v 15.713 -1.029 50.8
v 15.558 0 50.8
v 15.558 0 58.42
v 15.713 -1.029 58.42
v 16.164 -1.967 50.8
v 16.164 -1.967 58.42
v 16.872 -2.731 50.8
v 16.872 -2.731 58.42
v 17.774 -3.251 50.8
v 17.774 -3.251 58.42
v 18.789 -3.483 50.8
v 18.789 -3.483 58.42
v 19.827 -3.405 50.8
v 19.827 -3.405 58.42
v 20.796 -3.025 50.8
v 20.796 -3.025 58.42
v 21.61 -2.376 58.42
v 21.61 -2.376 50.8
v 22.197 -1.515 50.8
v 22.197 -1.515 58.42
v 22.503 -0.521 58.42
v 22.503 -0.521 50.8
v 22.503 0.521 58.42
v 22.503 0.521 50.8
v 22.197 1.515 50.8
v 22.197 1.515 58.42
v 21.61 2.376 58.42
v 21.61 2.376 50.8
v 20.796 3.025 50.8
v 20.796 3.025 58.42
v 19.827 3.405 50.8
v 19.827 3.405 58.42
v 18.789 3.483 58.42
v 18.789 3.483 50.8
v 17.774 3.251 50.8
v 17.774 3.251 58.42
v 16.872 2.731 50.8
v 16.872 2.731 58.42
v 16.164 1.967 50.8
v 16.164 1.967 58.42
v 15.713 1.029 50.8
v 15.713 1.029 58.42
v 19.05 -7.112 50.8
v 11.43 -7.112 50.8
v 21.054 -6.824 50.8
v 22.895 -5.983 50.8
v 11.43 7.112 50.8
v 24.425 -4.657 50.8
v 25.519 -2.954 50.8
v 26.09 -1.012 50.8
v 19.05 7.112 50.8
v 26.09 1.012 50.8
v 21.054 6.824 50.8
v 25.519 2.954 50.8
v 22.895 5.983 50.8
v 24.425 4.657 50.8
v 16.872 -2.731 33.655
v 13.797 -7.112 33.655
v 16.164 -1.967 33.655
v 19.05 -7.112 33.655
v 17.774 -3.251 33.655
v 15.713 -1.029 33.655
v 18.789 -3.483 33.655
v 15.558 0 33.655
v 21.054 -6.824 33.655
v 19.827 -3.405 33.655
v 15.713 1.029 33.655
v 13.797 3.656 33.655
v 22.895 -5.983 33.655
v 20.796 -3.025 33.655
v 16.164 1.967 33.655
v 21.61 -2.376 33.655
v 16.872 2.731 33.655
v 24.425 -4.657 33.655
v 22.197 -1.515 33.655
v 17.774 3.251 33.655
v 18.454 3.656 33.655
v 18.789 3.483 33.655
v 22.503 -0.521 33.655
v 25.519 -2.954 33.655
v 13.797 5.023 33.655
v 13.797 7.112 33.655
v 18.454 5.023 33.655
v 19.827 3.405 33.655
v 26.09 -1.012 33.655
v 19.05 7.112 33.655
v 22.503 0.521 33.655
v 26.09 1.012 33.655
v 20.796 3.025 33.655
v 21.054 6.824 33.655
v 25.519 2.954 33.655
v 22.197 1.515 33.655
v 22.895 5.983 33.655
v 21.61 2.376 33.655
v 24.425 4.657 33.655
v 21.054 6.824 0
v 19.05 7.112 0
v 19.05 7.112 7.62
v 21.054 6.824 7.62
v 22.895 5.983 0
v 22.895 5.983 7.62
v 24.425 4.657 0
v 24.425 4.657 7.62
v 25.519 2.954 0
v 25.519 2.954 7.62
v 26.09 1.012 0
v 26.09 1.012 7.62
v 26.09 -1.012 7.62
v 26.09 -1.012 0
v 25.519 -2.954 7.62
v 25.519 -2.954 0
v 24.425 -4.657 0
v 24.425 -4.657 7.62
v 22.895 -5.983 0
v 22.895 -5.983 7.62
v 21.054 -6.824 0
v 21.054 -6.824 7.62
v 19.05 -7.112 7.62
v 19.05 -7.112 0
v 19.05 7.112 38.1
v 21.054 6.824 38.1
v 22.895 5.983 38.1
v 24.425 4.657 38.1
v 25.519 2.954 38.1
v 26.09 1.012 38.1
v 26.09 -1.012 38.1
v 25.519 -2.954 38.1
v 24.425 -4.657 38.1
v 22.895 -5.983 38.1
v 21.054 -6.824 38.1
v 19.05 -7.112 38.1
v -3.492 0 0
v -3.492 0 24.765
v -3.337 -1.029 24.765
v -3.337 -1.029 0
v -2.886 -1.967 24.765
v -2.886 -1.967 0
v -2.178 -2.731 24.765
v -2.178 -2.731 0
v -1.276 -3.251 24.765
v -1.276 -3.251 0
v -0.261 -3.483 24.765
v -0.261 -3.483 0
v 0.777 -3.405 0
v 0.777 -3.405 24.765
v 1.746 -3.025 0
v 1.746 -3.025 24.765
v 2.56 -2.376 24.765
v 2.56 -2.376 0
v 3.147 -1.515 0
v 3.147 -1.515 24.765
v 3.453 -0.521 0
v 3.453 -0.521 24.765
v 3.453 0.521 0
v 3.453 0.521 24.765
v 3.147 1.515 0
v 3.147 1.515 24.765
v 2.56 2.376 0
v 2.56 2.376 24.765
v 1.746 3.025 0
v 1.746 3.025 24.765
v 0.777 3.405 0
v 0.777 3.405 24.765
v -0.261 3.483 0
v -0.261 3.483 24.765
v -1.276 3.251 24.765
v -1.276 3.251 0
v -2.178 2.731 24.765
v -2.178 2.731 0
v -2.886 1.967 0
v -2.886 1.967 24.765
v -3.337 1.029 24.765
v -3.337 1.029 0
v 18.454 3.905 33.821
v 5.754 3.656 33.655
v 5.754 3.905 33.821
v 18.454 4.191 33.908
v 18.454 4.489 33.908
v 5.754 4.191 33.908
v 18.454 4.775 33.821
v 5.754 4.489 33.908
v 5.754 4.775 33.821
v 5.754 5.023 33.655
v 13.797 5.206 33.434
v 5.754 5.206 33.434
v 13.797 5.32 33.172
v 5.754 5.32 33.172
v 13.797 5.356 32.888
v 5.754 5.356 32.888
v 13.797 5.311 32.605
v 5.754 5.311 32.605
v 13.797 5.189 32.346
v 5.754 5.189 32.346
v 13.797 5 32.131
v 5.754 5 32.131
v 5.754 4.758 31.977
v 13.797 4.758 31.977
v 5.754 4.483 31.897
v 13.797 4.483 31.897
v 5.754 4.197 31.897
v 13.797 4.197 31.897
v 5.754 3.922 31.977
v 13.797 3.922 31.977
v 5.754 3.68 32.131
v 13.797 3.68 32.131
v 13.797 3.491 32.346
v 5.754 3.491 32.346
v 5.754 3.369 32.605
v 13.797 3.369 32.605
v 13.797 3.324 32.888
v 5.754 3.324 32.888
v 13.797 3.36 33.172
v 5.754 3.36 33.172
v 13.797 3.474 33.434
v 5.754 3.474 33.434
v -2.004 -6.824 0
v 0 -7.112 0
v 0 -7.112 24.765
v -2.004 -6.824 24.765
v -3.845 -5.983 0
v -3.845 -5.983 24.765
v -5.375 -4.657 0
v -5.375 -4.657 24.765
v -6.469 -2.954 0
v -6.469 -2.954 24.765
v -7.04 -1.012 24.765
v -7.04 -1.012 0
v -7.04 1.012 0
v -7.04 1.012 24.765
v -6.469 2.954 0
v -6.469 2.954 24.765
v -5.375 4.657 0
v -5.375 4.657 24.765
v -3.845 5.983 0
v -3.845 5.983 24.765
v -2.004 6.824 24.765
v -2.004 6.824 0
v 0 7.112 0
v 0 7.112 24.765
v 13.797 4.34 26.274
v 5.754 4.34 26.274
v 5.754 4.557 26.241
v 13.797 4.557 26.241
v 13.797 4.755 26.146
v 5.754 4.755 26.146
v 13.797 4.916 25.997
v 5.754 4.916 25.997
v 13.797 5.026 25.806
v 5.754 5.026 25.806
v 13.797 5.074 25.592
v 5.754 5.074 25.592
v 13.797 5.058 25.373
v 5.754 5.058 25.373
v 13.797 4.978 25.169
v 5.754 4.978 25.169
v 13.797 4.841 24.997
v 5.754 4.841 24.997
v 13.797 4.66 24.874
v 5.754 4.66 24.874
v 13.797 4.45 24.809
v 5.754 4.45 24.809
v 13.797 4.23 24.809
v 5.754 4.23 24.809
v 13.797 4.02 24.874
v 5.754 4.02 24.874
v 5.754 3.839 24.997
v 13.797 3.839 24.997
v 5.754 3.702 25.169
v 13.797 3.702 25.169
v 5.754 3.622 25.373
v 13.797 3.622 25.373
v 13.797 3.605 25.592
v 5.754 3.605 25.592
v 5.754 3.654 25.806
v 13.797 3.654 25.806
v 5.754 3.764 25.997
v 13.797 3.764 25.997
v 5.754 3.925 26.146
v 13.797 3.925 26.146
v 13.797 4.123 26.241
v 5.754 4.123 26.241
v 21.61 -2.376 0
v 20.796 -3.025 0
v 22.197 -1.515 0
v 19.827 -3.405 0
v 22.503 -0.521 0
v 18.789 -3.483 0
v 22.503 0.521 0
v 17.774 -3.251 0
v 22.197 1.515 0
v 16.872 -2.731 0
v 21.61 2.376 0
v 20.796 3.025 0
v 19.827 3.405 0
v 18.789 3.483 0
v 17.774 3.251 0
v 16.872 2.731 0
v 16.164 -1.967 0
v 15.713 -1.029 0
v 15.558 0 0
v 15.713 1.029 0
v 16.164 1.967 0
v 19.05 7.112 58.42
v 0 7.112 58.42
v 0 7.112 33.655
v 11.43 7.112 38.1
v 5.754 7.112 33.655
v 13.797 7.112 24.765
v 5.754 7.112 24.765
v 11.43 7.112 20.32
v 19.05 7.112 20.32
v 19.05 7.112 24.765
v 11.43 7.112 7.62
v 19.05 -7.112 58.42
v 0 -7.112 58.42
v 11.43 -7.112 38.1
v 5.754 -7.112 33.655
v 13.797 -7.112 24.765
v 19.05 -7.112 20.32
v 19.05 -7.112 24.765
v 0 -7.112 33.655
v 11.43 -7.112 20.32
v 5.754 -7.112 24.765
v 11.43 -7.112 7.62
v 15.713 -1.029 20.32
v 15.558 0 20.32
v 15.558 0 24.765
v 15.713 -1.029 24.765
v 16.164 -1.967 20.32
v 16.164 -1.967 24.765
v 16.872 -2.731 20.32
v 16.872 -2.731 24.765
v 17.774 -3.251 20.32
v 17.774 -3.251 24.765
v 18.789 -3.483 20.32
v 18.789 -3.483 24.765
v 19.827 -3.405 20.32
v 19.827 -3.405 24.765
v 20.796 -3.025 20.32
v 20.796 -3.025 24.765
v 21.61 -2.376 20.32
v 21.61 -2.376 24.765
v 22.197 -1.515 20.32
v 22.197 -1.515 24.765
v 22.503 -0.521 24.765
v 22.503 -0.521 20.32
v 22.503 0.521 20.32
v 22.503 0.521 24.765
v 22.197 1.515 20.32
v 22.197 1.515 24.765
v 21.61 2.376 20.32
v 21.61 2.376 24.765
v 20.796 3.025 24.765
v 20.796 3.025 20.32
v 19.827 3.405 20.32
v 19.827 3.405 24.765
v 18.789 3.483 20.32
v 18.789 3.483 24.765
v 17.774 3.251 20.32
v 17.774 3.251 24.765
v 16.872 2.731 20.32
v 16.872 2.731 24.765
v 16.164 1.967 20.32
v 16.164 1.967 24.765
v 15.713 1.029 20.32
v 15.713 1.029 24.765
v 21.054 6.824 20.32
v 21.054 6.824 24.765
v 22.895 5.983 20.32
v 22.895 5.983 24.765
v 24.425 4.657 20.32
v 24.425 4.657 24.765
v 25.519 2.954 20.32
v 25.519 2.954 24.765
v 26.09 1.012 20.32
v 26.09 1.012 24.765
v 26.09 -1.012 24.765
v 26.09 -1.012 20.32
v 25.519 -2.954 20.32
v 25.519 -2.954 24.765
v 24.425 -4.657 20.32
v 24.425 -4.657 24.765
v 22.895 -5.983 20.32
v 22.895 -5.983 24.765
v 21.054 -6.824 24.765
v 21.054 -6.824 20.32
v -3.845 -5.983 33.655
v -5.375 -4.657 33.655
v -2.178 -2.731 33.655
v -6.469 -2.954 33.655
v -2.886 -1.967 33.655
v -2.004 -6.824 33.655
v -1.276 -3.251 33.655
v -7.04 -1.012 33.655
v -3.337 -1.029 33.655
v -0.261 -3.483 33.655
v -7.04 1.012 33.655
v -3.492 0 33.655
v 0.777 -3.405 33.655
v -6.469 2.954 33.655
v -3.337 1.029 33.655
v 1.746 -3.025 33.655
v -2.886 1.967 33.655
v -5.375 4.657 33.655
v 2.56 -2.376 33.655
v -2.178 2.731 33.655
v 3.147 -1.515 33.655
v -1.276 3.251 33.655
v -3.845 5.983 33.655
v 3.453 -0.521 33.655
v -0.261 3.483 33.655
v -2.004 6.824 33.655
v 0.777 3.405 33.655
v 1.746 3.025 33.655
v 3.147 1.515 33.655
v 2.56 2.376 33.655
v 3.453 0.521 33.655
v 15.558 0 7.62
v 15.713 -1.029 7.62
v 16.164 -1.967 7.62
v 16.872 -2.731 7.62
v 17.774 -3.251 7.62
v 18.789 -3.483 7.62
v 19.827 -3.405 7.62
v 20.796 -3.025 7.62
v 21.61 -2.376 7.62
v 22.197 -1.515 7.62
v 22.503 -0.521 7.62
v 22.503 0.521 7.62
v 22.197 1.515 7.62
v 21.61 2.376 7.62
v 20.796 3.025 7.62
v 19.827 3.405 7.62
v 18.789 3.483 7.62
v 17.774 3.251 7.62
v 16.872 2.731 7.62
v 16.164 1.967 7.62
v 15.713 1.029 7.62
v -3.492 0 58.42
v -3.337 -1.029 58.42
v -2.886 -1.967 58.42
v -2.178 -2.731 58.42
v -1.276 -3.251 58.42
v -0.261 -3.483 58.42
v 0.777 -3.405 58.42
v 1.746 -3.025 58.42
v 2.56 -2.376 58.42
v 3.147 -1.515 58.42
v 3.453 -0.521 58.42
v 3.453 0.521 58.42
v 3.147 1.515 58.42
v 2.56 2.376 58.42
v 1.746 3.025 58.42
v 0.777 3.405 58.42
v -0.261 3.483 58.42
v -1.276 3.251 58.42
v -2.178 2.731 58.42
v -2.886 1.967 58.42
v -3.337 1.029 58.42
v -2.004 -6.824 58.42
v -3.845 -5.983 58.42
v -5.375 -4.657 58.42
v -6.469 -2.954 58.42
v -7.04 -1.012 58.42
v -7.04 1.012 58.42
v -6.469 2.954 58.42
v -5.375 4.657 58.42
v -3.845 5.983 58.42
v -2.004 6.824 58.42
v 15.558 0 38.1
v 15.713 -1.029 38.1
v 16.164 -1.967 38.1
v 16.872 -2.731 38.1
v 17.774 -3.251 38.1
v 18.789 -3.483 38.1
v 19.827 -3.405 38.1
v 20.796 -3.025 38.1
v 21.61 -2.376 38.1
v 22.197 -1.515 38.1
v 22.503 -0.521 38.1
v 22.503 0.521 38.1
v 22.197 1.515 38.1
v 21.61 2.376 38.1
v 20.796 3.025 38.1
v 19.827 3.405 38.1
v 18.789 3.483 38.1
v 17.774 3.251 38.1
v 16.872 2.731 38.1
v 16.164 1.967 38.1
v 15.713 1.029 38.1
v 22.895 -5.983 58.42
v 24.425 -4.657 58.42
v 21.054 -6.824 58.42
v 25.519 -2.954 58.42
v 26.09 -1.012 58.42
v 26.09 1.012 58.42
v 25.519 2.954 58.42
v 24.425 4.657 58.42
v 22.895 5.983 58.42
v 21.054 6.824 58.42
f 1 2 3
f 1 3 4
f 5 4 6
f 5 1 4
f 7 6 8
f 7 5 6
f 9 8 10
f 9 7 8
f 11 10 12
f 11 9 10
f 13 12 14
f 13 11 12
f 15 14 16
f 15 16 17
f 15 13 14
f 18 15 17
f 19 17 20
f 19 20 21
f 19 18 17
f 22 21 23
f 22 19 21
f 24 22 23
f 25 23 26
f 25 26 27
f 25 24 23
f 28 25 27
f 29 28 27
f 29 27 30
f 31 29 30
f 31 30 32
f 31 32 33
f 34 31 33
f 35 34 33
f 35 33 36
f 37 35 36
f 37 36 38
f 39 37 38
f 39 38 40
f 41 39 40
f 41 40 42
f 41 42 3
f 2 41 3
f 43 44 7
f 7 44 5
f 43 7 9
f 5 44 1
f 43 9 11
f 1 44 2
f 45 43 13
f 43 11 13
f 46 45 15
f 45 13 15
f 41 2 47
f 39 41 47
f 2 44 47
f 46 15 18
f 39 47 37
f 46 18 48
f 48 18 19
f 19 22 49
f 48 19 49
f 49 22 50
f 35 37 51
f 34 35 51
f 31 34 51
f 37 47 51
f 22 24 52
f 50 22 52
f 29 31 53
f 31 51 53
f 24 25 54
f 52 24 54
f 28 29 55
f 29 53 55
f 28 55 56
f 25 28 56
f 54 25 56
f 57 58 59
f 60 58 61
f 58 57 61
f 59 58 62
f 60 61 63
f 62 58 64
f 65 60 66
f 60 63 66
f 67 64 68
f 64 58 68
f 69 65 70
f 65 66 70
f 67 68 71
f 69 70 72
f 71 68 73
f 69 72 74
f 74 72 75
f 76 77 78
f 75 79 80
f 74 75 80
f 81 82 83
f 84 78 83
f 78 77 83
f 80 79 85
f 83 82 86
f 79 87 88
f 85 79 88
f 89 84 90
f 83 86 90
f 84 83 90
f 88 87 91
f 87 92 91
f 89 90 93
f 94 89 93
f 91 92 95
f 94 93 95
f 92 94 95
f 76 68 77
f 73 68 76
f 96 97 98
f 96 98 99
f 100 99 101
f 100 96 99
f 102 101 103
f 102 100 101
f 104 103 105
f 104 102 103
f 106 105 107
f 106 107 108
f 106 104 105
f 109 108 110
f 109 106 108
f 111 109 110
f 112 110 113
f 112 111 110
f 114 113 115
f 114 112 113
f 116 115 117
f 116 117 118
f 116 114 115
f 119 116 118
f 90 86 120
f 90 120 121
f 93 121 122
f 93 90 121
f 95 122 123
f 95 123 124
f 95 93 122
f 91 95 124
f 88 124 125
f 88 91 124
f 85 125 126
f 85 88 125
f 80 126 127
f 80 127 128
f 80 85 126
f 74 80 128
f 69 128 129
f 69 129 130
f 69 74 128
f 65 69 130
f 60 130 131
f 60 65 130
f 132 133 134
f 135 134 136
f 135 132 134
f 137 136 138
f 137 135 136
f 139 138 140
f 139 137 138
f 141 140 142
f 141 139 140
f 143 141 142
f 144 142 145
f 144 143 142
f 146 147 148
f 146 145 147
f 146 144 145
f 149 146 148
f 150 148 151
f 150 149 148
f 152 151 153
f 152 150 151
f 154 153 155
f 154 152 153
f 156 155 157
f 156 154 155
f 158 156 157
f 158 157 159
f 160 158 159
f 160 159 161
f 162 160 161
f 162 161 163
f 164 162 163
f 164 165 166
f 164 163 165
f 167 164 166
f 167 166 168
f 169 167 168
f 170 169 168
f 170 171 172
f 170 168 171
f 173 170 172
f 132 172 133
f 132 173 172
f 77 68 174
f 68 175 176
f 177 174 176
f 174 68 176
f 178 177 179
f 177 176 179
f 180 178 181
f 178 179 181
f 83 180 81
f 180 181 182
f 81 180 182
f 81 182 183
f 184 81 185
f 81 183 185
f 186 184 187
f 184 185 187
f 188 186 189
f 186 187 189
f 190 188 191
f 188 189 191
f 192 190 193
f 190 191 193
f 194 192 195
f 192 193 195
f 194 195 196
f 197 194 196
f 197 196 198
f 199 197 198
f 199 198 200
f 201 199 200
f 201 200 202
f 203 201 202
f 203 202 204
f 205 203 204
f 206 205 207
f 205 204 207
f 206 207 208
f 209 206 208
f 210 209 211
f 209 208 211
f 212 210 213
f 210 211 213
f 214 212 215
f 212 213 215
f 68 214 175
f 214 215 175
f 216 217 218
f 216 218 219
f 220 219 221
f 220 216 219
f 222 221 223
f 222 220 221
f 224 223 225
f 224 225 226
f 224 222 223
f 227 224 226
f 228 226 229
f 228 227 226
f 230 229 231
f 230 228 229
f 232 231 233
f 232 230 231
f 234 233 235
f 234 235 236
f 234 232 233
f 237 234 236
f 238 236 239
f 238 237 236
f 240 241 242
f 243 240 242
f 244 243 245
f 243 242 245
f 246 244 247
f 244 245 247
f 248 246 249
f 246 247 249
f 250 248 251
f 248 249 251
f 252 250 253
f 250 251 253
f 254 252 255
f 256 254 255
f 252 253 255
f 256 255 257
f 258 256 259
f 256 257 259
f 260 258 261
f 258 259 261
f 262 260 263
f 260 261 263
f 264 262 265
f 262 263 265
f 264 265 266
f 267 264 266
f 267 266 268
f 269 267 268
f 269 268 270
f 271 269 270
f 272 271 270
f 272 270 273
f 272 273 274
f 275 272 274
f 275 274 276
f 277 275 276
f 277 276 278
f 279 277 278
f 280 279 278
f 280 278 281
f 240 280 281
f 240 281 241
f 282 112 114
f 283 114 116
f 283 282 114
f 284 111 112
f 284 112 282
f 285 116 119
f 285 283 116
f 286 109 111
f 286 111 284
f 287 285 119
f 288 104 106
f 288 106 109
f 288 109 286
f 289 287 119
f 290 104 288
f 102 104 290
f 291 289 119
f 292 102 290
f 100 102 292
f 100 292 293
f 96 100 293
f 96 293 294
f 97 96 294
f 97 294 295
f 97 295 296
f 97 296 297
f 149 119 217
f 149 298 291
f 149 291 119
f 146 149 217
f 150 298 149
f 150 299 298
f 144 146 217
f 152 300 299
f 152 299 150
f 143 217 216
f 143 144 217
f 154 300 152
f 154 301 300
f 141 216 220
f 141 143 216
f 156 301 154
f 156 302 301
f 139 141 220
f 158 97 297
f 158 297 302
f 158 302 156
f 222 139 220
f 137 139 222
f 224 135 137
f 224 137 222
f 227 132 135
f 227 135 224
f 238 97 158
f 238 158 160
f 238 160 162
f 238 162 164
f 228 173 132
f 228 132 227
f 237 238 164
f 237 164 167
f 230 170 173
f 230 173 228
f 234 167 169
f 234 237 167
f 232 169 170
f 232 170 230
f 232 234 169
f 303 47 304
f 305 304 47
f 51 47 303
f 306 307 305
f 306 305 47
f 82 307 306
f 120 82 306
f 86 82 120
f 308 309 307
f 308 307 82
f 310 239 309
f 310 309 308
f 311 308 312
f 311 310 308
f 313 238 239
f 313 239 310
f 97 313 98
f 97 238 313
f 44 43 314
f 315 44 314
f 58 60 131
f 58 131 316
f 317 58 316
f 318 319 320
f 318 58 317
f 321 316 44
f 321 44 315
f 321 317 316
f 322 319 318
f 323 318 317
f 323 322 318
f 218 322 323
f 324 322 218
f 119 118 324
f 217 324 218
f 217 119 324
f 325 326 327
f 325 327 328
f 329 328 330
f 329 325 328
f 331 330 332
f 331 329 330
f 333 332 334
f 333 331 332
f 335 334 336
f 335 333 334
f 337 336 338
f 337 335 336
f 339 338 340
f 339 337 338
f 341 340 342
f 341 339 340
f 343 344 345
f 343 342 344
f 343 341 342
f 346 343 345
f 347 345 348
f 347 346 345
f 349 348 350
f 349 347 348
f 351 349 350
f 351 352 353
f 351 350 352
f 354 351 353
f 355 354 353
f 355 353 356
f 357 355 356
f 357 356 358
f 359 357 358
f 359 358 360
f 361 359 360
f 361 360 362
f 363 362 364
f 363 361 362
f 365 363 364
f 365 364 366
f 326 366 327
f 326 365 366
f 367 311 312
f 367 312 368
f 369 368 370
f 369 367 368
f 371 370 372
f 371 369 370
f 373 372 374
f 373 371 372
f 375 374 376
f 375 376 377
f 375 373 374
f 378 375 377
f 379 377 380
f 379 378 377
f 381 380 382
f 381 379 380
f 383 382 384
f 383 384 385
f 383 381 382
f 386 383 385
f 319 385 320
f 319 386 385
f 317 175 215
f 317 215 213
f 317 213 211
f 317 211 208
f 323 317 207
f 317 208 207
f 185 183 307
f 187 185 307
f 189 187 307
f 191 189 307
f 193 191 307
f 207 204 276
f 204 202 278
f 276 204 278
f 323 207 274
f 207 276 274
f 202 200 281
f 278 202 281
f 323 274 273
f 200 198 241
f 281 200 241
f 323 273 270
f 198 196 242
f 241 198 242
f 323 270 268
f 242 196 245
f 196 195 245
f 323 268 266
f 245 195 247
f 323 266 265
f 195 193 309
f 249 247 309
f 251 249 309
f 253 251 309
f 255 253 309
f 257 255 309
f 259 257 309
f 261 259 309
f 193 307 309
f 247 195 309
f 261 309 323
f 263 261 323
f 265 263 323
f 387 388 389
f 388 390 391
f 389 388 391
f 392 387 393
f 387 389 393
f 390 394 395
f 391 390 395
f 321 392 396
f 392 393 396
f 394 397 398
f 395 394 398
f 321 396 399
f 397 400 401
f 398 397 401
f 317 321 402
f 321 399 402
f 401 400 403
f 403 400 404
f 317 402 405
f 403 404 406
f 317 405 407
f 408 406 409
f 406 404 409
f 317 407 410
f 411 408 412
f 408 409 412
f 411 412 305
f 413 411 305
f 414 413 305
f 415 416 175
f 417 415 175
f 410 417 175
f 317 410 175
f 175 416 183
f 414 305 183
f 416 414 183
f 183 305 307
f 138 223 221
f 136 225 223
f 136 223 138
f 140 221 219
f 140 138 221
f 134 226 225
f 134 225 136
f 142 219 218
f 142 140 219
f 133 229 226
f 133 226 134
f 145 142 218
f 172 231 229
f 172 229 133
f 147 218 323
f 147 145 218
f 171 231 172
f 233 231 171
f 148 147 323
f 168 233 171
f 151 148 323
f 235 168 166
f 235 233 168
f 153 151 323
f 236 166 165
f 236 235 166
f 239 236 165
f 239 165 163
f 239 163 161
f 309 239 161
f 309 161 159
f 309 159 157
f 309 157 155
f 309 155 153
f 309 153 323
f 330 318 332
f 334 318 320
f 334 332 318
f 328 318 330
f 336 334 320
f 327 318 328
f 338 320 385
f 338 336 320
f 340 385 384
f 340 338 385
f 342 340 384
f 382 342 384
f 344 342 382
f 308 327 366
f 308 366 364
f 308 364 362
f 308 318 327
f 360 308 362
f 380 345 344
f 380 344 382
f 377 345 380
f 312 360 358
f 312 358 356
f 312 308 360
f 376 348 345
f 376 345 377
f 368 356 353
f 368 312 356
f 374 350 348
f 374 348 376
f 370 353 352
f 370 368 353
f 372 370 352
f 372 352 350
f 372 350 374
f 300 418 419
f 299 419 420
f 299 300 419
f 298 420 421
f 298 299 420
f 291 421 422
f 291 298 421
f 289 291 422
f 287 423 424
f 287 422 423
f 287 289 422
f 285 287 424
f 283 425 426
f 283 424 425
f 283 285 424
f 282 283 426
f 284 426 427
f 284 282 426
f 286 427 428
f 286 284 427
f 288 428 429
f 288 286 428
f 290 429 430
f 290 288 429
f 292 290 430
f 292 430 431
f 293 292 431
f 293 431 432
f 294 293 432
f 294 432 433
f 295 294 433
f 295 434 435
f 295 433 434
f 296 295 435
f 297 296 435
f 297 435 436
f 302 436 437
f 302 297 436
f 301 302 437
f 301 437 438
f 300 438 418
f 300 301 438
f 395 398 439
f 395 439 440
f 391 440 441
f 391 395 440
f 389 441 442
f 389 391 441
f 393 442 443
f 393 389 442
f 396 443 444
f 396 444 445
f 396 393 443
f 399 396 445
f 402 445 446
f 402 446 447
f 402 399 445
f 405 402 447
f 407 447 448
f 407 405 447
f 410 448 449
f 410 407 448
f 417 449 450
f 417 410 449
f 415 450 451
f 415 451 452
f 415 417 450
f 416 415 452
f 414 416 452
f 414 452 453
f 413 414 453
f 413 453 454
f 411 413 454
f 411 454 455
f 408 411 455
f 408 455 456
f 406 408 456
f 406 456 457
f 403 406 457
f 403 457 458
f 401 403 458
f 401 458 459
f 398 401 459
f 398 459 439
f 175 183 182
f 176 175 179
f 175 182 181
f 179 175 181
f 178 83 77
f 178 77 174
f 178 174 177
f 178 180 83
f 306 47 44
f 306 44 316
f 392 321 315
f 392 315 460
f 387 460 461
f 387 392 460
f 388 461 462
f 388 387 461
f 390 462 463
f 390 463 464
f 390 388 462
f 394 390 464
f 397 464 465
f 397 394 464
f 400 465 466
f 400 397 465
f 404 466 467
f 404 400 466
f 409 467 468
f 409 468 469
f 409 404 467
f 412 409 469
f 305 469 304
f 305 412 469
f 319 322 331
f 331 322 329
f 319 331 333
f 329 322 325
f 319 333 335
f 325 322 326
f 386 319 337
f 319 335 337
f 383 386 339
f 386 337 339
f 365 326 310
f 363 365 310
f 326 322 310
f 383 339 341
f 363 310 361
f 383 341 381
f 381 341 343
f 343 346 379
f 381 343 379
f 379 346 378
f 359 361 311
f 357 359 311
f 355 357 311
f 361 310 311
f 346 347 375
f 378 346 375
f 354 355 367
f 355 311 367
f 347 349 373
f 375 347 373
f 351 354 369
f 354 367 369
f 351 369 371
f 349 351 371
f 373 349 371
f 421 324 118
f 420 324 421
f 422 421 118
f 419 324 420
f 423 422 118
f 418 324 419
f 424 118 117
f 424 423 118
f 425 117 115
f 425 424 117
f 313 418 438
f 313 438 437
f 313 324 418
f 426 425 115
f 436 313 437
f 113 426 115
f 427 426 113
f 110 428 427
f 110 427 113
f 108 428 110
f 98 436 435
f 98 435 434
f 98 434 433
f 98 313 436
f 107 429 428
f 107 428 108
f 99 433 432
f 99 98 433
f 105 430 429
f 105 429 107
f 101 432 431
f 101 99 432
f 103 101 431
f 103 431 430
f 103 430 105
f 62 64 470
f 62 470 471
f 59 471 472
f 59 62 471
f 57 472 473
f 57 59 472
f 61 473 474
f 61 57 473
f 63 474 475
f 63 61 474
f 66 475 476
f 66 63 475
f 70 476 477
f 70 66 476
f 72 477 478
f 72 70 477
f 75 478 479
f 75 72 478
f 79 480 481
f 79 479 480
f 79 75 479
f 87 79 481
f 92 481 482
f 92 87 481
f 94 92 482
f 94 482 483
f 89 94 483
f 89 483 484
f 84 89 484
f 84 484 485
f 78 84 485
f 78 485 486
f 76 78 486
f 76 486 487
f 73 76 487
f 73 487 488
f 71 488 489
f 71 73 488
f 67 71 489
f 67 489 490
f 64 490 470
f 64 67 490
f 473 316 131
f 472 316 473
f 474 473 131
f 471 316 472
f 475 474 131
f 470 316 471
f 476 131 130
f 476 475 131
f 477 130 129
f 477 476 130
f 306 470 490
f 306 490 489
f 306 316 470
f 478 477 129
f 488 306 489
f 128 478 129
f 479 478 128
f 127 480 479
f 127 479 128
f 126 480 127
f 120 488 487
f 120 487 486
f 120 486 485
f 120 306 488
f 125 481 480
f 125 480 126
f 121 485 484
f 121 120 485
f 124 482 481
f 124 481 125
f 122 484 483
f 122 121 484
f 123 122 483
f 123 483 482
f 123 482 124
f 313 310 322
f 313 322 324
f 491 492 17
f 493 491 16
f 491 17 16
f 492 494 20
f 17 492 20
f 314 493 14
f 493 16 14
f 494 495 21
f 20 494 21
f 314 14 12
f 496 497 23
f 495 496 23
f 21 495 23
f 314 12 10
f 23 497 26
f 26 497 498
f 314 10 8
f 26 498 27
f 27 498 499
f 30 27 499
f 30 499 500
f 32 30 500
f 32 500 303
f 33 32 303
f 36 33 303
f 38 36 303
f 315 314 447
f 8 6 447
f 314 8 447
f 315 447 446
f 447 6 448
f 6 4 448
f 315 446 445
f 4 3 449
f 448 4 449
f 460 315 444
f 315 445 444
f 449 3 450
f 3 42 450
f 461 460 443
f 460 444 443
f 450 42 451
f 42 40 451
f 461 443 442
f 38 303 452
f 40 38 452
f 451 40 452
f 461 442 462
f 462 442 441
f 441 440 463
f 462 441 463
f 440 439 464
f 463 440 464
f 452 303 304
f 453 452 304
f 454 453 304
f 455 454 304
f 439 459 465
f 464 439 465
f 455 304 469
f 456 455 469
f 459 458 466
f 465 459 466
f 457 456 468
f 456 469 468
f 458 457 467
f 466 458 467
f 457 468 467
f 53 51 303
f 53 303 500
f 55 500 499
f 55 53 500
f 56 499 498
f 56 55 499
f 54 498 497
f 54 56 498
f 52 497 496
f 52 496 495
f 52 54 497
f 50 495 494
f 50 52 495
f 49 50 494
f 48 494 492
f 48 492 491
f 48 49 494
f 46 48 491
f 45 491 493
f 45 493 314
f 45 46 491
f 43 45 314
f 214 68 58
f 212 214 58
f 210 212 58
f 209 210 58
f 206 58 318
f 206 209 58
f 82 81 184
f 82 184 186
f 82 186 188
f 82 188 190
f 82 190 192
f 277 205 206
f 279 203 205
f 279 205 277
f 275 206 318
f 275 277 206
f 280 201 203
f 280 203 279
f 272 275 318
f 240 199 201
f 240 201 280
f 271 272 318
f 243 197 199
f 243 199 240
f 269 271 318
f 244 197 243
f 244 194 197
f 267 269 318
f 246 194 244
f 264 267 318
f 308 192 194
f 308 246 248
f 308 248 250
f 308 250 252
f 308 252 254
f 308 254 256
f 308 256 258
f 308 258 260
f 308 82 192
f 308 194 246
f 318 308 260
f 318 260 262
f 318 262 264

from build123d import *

# Parameters (mm, degrees)
SKETCH1_R           = 3.4925
BOSS_EXTRUDE1_DEPTH = 58.42
SKETCH2_W           = 21.884407041
SKETCH2_H           = 12.7
SKETCH2_W_2         = 26.524954362
SKETCH2_W_3         = 12.7
SKETCH2_H_2         = 8.89
CUT_EXTRUDE1_DEPTH  = 14.224
SKETCH4_W           = 15.997333927
SKETCH4_H           = 8.89
CUT_EXTRUDE2_DEPTH  = 14.224
SKETCH5_R           = 0.7366
SKETCH5_R_2         = 1.016
CUT_EXTRUDE3_DEPTH  = 12.7


with BuildPart() as part:
    # Sketch1 → Boss-Extrude1 (new body)
    with BuildSketch(Plane.XY):
        with BuildLine():
            Line((0, 7.112), (19.05, 7.112))
            ThreePointArc((19.05, 7.112), (26.162, 0), (19.05, -7.112))
            Line((19.05, -7.112), (0, -7.112))
            ThreePointArc((0, -7.112), (-7.112, 0), (0, 7.112))
        make_face()
        with Locations(Location((0, 0, 0), (0, 0, 180))):
            Circle(SKETCH1_R, mode=Mode.SUBTRACT)
        with Locations(Location((19.05, 0, 0), (0, 0, 180))):
            Circle(SKETCH1_R, mode=Mode.SUBTRACT)
    extrude(amount=BOSS_EXTRUDE1_DEPTH)

    # Sketch2 → Cut-Extrude1 (cut)
    with BuildSketch(Plane(origin=(0, 7.112, 0), x_dir=(1, 0, 0), z_dir=(0, 1, 0))):
        with Locations((22.372203521, -13.97)):
            Rectangle(SKETCH2_W, SKETCH2_H)
        with Locations((24.692477181, -44.45)):
            Rectangle(SKETCH2_W_2, SKETCH2_H)
        with Locations((20.147317334, -29.21)):
            Rectangle(SKETCH2_W_3, SKETCH2_H_2)
    extrude(amount=-CUT_EXTRUDE1_DEPTH, mode=Mode.SUBTRACT)

    # Sketch4 → Cut-Extrude2 (cut)
    with BuildSketch(Plane(origin=(0, 7.112, 0), x_dir=(1, 0, 0), z_dir=(0, 1, 0))):
        with Locations((-2.244730027, -29.21)):
            Rectangle(SKETCH4_W, SKETCH4_H)
    extrude(amount=-CUT_EXTRUDE2_DEPTH, mode=Mode.SUBTRACT)

    # Sketch5 → Cut-Extrude3 (cut)
    with BuildSketch(Plane.ZY.offset(-5.753936937)):
        with Locations((25.537266397, 4.339945309)):
            Circle(SKETCH5_R)
        with Locations(Location((32.903266397, 4.339945309, 0), (0, 0, 317.722495694))):
            Circle(SKETCH5_R_2)
    extrude(amount=-CUT_EXTRUDE3_DEPTH, mode=Mode.SUBTRACT)


solid = part.part
